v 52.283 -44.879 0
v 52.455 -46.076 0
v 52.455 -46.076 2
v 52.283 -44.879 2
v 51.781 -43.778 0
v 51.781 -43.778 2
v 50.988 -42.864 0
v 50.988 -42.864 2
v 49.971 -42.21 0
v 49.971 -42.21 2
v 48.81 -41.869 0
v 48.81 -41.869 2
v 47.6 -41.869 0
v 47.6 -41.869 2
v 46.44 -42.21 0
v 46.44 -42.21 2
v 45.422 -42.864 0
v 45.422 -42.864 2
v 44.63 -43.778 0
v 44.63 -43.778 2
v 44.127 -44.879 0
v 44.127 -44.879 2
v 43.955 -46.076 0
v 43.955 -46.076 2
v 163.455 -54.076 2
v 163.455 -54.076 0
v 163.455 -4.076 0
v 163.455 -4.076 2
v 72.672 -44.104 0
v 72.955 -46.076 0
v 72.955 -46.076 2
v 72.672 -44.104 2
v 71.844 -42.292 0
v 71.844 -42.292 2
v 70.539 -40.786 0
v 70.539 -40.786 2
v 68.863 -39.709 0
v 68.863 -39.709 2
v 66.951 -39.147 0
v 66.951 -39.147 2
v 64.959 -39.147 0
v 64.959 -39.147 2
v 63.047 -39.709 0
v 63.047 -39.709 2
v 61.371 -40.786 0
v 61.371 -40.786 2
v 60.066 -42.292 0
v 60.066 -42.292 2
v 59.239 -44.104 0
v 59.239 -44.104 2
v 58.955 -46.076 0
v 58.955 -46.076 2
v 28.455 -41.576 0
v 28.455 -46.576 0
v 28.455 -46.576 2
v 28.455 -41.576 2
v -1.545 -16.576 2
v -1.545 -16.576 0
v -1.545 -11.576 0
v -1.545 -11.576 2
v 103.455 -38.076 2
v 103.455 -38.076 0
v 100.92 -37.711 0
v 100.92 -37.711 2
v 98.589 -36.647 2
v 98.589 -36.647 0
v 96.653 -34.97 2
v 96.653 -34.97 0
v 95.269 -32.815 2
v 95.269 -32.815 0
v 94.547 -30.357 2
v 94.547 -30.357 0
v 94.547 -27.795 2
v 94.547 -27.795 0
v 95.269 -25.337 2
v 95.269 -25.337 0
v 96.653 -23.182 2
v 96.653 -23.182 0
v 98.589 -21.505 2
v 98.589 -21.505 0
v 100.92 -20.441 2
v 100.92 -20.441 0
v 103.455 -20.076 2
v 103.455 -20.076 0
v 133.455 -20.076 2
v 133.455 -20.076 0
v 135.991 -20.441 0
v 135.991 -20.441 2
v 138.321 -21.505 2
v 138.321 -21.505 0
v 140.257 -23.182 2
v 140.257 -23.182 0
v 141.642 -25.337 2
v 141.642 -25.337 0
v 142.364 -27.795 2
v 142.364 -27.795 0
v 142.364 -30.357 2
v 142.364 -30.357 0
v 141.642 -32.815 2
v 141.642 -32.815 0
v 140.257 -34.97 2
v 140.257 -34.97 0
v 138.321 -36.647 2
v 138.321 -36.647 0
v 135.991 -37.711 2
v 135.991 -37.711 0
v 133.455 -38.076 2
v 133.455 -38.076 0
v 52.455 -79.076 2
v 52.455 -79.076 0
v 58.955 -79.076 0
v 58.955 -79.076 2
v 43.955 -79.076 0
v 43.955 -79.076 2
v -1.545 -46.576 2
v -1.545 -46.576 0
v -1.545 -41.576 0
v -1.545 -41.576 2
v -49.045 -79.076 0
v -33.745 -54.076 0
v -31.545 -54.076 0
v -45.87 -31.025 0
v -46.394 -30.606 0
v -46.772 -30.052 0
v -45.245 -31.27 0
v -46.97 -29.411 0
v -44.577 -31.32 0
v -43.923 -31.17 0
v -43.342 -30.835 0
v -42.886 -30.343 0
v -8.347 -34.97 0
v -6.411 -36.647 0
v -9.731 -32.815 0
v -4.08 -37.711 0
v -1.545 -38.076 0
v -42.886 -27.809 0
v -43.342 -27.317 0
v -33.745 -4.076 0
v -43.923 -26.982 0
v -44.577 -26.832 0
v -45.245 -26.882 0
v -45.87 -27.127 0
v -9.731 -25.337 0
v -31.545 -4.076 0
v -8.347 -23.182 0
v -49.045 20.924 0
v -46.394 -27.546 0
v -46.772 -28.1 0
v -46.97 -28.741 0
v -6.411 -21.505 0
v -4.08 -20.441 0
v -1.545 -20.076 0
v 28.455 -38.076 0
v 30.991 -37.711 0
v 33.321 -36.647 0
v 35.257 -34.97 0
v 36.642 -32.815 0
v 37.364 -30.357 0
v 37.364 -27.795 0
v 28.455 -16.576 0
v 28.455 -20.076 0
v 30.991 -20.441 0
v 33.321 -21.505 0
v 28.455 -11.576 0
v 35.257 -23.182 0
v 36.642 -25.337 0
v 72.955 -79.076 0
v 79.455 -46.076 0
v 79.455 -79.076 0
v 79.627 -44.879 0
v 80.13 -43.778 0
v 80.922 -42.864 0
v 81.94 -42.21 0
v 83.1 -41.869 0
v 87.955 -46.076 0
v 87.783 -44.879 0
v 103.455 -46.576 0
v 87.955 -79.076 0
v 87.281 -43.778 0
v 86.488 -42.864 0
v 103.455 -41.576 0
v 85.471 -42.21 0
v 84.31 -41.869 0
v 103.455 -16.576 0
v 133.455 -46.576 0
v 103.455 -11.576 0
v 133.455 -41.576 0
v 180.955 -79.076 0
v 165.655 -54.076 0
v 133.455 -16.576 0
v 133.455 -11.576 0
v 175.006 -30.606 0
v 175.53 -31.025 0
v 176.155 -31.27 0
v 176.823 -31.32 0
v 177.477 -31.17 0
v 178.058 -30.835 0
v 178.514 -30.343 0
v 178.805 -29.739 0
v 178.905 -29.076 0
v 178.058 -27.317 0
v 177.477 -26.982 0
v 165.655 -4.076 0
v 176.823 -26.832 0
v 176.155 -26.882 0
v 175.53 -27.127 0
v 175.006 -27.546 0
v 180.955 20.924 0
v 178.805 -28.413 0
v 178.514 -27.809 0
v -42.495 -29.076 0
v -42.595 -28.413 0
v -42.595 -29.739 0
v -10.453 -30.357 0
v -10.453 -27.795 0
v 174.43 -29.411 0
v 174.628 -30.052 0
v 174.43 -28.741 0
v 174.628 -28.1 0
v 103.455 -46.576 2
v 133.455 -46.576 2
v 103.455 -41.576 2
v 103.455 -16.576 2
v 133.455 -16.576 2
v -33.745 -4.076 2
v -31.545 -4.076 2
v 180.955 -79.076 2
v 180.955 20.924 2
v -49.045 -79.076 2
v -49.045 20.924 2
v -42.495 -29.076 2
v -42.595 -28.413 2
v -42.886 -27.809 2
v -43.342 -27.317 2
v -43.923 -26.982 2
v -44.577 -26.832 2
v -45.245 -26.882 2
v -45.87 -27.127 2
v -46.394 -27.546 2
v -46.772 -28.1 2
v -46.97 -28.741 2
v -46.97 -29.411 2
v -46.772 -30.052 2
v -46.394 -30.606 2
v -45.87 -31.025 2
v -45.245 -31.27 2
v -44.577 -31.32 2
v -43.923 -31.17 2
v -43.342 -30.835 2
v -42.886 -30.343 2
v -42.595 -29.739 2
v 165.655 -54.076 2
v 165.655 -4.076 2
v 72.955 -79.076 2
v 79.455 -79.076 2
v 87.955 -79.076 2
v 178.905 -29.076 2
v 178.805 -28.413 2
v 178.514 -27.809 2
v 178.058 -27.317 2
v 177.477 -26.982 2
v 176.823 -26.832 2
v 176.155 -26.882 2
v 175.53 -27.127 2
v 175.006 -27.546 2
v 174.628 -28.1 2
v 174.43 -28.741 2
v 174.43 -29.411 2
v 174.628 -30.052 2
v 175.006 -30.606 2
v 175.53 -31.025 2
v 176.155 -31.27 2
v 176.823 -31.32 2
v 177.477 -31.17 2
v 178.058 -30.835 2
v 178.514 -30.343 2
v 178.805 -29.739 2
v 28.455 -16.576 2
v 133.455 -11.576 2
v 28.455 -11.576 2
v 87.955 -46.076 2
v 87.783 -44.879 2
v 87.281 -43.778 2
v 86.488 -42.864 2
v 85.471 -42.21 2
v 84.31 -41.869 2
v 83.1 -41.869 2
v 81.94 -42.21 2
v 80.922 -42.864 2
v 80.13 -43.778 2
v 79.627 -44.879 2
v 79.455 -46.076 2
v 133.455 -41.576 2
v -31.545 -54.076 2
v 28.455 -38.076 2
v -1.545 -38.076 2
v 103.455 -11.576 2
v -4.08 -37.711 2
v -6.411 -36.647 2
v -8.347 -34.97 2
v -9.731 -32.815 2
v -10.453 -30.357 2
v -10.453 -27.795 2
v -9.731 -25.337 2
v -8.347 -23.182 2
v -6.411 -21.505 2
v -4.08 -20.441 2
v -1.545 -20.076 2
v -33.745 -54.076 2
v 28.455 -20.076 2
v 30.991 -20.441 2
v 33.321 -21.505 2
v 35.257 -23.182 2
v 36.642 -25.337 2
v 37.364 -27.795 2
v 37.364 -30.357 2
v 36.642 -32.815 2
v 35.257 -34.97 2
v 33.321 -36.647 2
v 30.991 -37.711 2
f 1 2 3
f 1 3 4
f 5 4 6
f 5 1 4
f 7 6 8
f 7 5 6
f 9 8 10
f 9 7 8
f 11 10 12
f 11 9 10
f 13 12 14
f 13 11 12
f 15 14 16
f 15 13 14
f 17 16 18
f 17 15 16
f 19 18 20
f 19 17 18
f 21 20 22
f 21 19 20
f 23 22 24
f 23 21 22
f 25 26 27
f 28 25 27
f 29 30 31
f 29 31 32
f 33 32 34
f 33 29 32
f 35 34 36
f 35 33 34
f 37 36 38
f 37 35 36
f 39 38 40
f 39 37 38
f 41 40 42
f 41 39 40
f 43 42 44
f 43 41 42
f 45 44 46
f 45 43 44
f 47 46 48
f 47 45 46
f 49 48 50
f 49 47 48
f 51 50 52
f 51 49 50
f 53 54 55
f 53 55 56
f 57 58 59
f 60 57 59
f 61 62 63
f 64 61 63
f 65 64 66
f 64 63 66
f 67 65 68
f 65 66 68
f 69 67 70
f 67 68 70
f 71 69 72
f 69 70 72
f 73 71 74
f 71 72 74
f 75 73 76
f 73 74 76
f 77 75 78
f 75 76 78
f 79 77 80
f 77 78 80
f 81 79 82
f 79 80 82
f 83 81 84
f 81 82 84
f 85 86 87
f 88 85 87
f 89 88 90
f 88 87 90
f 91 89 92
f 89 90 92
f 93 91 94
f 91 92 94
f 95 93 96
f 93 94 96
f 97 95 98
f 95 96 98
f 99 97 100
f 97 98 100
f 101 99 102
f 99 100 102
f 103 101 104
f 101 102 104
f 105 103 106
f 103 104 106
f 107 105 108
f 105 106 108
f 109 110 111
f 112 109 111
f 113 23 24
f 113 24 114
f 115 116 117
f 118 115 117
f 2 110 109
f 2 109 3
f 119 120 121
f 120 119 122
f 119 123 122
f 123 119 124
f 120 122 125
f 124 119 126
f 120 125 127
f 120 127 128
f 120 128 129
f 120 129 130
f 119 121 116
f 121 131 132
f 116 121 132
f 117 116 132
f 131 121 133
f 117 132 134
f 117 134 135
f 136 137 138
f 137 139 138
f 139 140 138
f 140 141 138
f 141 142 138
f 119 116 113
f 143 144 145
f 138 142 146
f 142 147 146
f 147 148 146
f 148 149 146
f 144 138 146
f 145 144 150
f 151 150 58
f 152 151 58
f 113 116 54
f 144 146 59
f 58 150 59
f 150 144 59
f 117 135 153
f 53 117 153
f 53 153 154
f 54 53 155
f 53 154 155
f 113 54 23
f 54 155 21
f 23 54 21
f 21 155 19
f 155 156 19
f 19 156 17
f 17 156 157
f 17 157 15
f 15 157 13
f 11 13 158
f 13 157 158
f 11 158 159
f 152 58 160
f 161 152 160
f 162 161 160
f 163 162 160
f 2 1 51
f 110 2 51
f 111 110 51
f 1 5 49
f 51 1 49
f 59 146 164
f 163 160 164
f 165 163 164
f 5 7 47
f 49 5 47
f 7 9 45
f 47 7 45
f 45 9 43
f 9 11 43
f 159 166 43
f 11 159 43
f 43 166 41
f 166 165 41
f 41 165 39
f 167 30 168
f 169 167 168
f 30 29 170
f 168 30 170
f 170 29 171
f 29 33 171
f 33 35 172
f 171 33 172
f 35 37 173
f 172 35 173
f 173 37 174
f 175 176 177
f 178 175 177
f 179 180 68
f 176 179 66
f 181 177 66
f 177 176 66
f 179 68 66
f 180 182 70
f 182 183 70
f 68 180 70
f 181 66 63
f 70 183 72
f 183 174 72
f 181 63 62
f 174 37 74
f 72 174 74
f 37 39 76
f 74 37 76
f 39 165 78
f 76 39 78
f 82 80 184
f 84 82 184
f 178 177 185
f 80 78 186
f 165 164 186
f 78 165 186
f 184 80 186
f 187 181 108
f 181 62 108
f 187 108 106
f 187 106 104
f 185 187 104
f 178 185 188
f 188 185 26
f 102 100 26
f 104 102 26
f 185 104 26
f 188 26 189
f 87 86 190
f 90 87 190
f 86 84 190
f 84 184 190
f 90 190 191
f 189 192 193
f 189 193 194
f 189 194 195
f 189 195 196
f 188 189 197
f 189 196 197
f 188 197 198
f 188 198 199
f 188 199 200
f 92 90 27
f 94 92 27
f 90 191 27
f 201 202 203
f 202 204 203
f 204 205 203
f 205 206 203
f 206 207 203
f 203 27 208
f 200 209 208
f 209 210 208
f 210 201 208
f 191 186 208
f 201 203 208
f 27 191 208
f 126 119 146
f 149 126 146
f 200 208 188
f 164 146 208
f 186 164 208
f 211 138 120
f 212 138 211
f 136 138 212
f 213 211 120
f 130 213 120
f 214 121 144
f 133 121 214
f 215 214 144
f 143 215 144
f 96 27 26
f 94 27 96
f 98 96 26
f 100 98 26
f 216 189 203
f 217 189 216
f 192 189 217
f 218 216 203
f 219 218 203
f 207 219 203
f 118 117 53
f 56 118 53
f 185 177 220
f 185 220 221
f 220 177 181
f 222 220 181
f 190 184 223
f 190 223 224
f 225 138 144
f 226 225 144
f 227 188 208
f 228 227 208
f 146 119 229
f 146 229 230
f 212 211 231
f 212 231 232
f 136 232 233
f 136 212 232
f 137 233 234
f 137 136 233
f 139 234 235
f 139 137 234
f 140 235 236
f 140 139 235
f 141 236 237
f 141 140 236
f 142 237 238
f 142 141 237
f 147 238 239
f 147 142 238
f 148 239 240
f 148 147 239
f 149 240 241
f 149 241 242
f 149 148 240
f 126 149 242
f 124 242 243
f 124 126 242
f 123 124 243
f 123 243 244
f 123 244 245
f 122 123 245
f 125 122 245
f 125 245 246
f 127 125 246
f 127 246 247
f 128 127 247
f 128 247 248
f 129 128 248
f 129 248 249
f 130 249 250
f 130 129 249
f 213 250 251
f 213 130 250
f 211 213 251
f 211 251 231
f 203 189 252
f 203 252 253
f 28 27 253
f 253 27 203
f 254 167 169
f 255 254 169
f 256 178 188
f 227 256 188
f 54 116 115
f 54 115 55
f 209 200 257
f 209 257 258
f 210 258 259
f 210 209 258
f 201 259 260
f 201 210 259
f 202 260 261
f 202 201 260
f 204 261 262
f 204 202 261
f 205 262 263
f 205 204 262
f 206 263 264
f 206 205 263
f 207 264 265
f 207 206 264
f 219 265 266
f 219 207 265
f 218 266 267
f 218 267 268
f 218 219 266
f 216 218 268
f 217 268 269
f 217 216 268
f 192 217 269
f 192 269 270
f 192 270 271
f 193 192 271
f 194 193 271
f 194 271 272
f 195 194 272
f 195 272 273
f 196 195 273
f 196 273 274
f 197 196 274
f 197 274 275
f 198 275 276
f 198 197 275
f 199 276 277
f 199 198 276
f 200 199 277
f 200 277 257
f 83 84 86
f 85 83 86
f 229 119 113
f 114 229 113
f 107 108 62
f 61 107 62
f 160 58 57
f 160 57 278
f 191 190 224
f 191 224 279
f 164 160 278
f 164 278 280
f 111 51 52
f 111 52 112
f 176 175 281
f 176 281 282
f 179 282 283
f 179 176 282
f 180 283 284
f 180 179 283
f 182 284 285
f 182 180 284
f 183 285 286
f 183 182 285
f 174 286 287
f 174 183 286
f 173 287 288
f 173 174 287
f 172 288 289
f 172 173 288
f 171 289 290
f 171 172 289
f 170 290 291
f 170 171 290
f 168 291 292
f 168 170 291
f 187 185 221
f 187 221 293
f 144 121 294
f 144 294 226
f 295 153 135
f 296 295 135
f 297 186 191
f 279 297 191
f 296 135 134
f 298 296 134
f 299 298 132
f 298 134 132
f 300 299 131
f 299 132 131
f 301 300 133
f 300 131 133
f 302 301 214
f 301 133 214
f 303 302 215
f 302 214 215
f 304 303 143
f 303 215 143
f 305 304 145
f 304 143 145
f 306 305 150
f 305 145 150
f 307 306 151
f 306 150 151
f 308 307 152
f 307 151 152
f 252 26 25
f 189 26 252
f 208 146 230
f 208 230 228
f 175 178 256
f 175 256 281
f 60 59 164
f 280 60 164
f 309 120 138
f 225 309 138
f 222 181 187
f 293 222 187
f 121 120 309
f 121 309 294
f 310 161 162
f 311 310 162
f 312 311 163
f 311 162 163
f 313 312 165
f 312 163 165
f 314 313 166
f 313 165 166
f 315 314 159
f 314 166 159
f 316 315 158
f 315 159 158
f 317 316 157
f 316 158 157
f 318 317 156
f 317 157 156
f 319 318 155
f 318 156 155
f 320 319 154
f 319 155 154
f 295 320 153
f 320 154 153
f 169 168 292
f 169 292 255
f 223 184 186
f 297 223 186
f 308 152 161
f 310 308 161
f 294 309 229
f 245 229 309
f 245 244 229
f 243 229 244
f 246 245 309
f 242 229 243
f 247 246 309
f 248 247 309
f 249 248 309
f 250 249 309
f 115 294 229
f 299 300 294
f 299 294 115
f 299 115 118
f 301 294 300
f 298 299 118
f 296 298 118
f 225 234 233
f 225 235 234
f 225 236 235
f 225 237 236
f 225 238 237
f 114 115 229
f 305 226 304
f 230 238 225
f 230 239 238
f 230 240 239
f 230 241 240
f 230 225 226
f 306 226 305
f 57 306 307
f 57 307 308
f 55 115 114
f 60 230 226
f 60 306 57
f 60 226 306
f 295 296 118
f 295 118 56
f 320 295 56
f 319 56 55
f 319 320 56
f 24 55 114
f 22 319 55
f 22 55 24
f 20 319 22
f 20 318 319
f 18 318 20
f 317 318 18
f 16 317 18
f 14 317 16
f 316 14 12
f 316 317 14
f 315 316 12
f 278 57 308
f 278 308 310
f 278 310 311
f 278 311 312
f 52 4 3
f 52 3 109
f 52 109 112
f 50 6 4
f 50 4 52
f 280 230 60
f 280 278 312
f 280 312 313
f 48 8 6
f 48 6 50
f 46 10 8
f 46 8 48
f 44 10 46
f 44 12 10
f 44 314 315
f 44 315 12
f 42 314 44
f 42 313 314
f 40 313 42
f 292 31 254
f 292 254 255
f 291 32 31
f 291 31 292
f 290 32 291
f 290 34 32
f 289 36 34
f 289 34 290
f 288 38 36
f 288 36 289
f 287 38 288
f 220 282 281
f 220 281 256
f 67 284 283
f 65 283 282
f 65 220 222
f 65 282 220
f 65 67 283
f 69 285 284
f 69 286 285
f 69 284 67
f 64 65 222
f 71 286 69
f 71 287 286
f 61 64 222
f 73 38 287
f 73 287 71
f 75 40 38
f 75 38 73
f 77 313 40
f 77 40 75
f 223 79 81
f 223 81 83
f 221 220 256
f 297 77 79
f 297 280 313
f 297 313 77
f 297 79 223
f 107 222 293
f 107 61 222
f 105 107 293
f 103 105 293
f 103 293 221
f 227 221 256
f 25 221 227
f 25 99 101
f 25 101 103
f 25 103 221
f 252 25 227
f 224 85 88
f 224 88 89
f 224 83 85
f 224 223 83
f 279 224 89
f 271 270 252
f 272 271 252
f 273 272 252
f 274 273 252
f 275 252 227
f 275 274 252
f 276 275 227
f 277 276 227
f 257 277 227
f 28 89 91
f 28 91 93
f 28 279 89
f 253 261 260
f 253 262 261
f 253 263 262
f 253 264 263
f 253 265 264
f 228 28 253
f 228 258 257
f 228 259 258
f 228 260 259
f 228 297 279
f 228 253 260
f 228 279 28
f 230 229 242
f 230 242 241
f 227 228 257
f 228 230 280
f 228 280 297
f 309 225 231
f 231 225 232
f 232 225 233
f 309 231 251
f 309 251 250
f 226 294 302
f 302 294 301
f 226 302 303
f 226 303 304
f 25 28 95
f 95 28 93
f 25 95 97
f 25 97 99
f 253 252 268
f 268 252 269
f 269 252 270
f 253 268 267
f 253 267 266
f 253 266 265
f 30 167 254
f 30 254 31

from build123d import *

# Parameters (mm, degrees)
SKETCH_1_W                    = 230
SKETCH_1_H                    = 100
EXTRUDE_1_DEPTH               = 2
CUT_EXTRUDE_2_DEPTH           = 2
CUT_EXTRUDE_2_DEPTH_BACK      = 2
SKETCH_3_W                    = 2.2
SKETCH_3_H                    = 50
SKETCH_3_W_2                  = 30
SKETCH_3_H_2                  = 5
CUT_EXTRUDE_3_DEPTH           = 2
CUT_EXTRUDE_3_DEPTH_BACK      = 2
SKETCH_5_R                    = 2.25
CUT_EXTRUDE_8_DEPTH           = 2
CUT_EXTRUDE_8_TAPER           = 1
CUT_EXTRUDE_8_OTHER_WAY_DEPTH = 2


with BuildPart() as part:
    # 草图1 → 凸台-拉伸1 (new body)
    with BuildSketch(Plane.XY):
        with Locations((65.955242642, -29.076013845)):
            Rectangle(SKETCH_1_W, SKETCH_1_H)
    extrude(amount=EXTRUDE_1_DEPTH)

    # 草图3 → 切除-拉伸2 (cut, two sides: drawn at the far end of the back side and taken through both)
    with BuildSketch(Plane.XY.offset(-CUT_EXTRUDE_2_DEPTH_BACK)):
        with Locations((-32.644757358, -29.076013845)):
            Rectangle(SKETCH_3_W, SKETCH_3_H)
        with Locations((13.455242642, -14.076013845)):
            Rectangle(SKETCH_3_W_2, SKETCH_3_H_2)
        with BuildLine():
            Line((-1.544757358, -20.076013845), (28.455242642, -20.076013845))
            ThreePointArc((28.455242642, -20.076013845), (37.455242642, -29.076013845), (28.455242642, -38.076013845))
            Line((28.455242642, -38.076013845), (-1.544757358, -38.076013845))
            ThreePointArc((-1.544757358, -38.076013845), (-10.544757358, -29.076013845), (-1.544757358, -20.076013845))
        make_face()
        with Locations((13.455242642, -44.076013845)):
            Rectangle(SKETCH_3_W_2, SKETCH_3_H_2)
        with Locations((118.455242642, -44.076013845)):
            Rectangle(SKETCH_3_W_2, SKETCH_3_H_2)
        with BuildLine():
            Line((133.455242642, -38.076013845), (103.455242642, -38.076013845))
            ThreePointArc((103.455242642, -38.076013845), (94.455242642, -29.076013845), (103.455242642, -20.076013845))
            Line((103.455242642, -20.076013845), (133.455242642, -20.076013845))
            ThreePointArc((133.455242642, -20.076013845), (142.455242642, -29.076013845), (133.455242642, -38.076013845))
        make_face()
        with Locations((118.455242642, -14.076013845)):
            Rectangle(SKETCH_3_W_2, SKETCH_3_H_2)
        with Locations((164.555242642, -29.076013845)):
            Rectangle(SKETCH_3_W, SKETCH_3_H)
    extrude(amount=CUT_EXTRUDE_2_DEPTH + CUT_EXTRUDE_2_DEPTH_BACK, mode=Mode.SUBTRACT)

    # 草图4 → 切除-拉伸3 (cut, two sides: drawn at the far end of the back side and taken through both)
    with BuildSketch(Plane.XY.offset(-CUT_EXTRUDE_3_DEPTH_BACK)):
        with BuildLine():
            Line((43.955242642, -46.076013845), (43.955242642, -79.076013845))
            Line((43.955242642, -79.076013845), (52.455242642, -79.076013845))
            Line((52.455242642, -79.076013845), (52.455242642, -46.076013845))
            ThreePointArc((52.455242642, -46.076013845), (48.205242642, -41.826013845), (43.955242642, -46.076013845))
        make_face()
        with BuildLine():
            Line((58.955242642, -46.076013845), (58.955242642, -79.076013845))
            Line((58.955242642, -79.076013845), (72.955242642, -79.076013845))
            Line((72.955242642, -79.076013845), (72.955242642, -46.076013845))
            ThreePointArc((72.955242642, -46.076013845), (65.955242642, -39.076013845), (58.955242642, -46.076013845))
        make_face()
        with BuildLine():
            Line((79.455242642, -46.076013845), (79.455242642, -79.076013845))
            Line((79.455242642, -79.076013845), (87.955242642, -79.076013845))
            Line((87.955242642, -79.076013845), (87.955242642, -46.076013845))
            ThreePointArc((87.955242642, -46.076013845), (83.705242642, -41.826013845), (79.455242642, -46.076013845))
        make_face()
    extrude(amount=CUT_EXTRUDE_3_DEPTH + CUT_EXTRUDE_3_DEPTH_BACK, mode=Mode.SUBTRACT)

    # 草图5 → 切除-拉伸8 (cut)
    with BuildSketch(Plane.XY):
        with Locations((-44.744757358, -29.076013845)):
            Circle(SKETCH_5_R)
        with Locations((176.655242642, -29.076013845)):
            Circle(SKETCH_5_R)
    extrude(amount=-CUT_EXTRUDE_8_DEPTH, taper=CUT_EXTRUDE_8_TAPER, mode=Mode.SUBTRACT)

    # 草图5 → 切除-拉伸8 other way (cut)
    with BuildSketch(Plane.XY):
        with Locations((-44.744757358, -29.076013845)):
            Circle(SKETCH_5_R)
        with Locations((176.655242642, -29.076013845)):
            Circle(SKETCH_5_R)
    extrude(amount=CUT_EXTRUDE_8_OTHER_WAY_DEPTH, mode=Mode.SUBTRACT)


solid = part.part
